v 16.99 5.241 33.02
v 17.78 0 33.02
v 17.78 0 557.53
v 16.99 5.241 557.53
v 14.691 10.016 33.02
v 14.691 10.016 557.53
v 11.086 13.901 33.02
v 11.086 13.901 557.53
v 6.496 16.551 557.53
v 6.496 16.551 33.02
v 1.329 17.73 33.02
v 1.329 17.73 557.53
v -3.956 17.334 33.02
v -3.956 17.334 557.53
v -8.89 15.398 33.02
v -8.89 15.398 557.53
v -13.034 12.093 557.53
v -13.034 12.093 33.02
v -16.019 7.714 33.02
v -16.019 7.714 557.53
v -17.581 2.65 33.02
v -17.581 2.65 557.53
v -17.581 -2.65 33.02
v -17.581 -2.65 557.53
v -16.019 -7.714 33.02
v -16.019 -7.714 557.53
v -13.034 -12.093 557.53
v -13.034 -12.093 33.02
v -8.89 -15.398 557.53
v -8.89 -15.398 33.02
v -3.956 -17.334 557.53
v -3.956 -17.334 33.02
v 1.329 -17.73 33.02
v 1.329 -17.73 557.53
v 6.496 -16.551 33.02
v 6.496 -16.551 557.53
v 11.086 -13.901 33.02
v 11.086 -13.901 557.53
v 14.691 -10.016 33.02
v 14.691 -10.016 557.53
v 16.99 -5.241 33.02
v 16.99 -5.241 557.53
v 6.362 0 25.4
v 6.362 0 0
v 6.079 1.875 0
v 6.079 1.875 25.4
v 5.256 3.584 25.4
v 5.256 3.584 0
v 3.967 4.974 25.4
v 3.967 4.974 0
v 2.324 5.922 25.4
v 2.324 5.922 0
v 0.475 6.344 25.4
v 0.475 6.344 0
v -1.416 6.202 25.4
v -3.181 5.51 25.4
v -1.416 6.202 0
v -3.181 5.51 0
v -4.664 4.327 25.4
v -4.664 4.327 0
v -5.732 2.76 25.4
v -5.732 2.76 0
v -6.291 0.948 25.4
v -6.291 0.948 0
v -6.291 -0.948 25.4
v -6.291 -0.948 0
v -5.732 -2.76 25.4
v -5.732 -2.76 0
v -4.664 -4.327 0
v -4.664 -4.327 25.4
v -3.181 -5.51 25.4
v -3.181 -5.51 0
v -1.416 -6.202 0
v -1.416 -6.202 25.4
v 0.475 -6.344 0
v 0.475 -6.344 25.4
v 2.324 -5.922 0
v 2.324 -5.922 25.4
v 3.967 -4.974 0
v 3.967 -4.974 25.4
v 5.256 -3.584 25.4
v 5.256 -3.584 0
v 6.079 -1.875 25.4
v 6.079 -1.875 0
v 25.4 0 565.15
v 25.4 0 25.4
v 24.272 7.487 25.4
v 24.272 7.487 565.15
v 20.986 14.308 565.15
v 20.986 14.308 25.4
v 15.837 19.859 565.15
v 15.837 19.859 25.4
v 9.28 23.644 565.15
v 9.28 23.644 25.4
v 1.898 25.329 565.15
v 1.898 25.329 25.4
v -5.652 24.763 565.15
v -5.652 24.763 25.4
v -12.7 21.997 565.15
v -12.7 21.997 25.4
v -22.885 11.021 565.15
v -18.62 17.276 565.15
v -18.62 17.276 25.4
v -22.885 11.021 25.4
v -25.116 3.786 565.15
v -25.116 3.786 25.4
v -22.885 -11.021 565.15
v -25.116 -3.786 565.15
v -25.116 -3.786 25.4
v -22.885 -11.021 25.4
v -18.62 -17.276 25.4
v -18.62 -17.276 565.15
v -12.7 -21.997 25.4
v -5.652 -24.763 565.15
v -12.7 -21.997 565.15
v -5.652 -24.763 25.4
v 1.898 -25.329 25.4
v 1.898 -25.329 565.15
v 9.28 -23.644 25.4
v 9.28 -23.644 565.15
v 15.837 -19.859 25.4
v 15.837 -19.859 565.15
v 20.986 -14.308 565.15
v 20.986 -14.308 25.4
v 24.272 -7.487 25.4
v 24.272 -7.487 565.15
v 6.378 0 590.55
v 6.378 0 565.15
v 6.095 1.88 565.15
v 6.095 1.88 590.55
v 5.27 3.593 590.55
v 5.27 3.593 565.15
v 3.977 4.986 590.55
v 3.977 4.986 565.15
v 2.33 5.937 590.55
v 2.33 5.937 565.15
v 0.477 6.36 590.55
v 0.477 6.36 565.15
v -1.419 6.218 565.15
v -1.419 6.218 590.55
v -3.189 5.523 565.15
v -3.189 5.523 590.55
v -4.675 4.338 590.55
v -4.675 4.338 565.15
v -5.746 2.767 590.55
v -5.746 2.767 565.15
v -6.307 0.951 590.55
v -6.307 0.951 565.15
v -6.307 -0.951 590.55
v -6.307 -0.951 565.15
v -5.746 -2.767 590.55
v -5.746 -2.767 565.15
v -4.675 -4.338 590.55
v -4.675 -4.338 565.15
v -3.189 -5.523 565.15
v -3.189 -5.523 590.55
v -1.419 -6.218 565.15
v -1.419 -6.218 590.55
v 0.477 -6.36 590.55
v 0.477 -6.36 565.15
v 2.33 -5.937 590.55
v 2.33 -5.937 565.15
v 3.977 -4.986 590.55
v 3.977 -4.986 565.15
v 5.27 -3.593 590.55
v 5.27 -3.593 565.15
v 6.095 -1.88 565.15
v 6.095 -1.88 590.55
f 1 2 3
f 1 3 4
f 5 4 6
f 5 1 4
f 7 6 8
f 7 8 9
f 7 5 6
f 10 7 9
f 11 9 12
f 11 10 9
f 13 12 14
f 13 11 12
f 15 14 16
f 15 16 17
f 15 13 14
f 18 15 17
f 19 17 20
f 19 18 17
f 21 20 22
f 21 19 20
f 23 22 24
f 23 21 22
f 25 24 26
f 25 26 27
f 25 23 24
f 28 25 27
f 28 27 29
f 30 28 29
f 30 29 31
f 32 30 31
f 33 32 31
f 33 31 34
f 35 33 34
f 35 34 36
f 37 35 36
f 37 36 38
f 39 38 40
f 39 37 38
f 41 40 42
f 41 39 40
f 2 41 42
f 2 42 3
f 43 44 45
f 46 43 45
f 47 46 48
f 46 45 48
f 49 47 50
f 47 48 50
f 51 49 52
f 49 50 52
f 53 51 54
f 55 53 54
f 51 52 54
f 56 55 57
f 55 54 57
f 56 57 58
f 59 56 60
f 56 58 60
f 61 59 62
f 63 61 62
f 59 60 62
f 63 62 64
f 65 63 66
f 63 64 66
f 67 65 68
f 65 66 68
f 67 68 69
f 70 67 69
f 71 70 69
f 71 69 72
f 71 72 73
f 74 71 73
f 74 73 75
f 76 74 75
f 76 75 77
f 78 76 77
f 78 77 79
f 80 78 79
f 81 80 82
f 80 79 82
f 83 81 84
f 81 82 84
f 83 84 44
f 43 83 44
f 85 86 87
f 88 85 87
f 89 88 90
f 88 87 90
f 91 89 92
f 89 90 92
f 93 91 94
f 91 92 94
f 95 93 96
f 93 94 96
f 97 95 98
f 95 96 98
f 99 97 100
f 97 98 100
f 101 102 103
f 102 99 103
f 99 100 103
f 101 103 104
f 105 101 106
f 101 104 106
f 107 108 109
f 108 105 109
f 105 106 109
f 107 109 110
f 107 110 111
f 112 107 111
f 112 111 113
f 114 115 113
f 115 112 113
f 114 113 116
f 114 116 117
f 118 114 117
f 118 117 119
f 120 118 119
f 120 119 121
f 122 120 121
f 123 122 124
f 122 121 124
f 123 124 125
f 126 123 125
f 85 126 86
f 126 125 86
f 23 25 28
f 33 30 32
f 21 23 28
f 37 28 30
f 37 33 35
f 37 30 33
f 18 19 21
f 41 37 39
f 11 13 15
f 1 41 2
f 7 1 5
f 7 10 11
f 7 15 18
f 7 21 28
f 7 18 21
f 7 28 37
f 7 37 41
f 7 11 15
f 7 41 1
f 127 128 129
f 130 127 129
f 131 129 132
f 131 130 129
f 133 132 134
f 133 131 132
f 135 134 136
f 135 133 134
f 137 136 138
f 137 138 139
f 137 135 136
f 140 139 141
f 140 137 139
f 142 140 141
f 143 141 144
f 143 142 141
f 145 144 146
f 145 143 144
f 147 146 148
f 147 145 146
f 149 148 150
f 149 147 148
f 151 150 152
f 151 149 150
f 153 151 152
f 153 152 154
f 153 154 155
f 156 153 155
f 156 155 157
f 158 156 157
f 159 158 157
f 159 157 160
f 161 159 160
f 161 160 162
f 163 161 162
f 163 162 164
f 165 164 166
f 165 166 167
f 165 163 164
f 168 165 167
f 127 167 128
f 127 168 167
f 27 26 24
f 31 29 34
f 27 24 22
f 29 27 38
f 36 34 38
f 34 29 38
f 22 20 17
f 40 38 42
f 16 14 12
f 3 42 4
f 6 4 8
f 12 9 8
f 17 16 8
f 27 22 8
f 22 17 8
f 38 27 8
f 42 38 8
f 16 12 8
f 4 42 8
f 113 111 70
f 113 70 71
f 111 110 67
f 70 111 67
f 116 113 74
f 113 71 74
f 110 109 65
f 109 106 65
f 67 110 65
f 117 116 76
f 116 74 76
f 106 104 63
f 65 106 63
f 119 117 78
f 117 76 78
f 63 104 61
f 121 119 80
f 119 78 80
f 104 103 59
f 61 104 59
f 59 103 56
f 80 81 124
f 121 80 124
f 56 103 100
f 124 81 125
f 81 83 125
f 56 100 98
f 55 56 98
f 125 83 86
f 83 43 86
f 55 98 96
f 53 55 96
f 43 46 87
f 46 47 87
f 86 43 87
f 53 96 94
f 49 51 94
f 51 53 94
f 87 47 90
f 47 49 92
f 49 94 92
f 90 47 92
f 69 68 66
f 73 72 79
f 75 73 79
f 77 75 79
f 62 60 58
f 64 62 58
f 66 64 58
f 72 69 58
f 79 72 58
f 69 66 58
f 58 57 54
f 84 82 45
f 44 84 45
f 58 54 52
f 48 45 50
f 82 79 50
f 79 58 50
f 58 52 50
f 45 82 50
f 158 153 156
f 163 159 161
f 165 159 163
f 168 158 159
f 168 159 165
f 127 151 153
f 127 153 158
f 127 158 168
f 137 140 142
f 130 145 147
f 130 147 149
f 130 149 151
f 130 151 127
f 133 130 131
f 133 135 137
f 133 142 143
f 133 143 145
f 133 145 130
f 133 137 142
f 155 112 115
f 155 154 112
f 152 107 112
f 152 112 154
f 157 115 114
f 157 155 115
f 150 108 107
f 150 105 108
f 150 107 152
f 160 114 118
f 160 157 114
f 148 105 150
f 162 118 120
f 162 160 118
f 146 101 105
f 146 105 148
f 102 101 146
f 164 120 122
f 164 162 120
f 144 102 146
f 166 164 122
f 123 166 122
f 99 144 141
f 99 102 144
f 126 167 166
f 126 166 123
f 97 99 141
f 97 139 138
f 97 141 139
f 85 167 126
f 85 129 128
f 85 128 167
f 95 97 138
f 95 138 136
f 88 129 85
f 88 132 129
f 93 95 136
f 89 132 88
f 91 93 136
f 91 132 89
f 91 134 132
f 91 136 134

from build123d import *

# Parameters (mm, degrees)
SKETCH1_R           = 25.4
BOSS_EXTRUDE1_DEPTH = 590.55
SKETCH2_OUTSIDE_W   = 171.78
SKETCH2_OUTSIDE_H   = 171.78
SKETCH2_OUTSIDE_R   = 6.361935525
CUT_EXTRUDE1_DEPTH  = 25.4
SKETCH5_OUTSIDE_W   = 171.78
SKETCH5_OUTSIDE_H   = 171.78
SKETCH5_OUTSIDE_R   = 6.377907631
CUT_EXTRUDE4_DEPTH  = 25.4
SHELL3_START        = 33.02
SHELL3_OUTLINE_R    = 17.78
SHELL3_DEPTH        = 524.51


# Read off the part's stored shape, not the designer's step: Shell3
with BuildPart() as part:
    # Sketch1 → Boss-Extrude1 (new body)
    with BuildSketch(Plane.XY):
        Circle(SKETCH1_R)
    extrude(amount=BOSS_EXTRUDE1_DEPTH)

    # Sketch2 outside → Cut-Extrude1 (cut)
    with BuildSketch(Plane.XY):
        Rectangle(SKETCH2_OUTSIDE_W, SKETCH2_OUTSIDE_H)
        Circle(SKETCH2_OUTSIDE_R, mode=Mode.SUBTRACT)
    extrude(amount=CUT_EXTRUDE1_DEPTH, mode=Mode.SUBTRACT)

    # Sketch5 outside → Cut-Extrude4 (cut)
    with BuildSketch(Plane.XY.offset(590.55)):
        Rectangle(SKETCH5_OUTSIDE_W, SKETCH5_OUTSIDE_H)
        Circle(SKETCH5_OUTSIDE_R, mode=Mode.SUBTRACT)
    extrude(amount=-CUT_EXTRUDE4_DEPTH, mode=Mode.SUBTRACT)

    # Shell3 outline → Shell3 (cut)
    with BuildSketch(Plane.XY.offset(SHELL3_START)):
        Circle(SHELL3_OUTLINE_R)
    extrude(amount=SHELL3_DEPTH, mode=Mode.SUBTRACT)


solid = part.part
